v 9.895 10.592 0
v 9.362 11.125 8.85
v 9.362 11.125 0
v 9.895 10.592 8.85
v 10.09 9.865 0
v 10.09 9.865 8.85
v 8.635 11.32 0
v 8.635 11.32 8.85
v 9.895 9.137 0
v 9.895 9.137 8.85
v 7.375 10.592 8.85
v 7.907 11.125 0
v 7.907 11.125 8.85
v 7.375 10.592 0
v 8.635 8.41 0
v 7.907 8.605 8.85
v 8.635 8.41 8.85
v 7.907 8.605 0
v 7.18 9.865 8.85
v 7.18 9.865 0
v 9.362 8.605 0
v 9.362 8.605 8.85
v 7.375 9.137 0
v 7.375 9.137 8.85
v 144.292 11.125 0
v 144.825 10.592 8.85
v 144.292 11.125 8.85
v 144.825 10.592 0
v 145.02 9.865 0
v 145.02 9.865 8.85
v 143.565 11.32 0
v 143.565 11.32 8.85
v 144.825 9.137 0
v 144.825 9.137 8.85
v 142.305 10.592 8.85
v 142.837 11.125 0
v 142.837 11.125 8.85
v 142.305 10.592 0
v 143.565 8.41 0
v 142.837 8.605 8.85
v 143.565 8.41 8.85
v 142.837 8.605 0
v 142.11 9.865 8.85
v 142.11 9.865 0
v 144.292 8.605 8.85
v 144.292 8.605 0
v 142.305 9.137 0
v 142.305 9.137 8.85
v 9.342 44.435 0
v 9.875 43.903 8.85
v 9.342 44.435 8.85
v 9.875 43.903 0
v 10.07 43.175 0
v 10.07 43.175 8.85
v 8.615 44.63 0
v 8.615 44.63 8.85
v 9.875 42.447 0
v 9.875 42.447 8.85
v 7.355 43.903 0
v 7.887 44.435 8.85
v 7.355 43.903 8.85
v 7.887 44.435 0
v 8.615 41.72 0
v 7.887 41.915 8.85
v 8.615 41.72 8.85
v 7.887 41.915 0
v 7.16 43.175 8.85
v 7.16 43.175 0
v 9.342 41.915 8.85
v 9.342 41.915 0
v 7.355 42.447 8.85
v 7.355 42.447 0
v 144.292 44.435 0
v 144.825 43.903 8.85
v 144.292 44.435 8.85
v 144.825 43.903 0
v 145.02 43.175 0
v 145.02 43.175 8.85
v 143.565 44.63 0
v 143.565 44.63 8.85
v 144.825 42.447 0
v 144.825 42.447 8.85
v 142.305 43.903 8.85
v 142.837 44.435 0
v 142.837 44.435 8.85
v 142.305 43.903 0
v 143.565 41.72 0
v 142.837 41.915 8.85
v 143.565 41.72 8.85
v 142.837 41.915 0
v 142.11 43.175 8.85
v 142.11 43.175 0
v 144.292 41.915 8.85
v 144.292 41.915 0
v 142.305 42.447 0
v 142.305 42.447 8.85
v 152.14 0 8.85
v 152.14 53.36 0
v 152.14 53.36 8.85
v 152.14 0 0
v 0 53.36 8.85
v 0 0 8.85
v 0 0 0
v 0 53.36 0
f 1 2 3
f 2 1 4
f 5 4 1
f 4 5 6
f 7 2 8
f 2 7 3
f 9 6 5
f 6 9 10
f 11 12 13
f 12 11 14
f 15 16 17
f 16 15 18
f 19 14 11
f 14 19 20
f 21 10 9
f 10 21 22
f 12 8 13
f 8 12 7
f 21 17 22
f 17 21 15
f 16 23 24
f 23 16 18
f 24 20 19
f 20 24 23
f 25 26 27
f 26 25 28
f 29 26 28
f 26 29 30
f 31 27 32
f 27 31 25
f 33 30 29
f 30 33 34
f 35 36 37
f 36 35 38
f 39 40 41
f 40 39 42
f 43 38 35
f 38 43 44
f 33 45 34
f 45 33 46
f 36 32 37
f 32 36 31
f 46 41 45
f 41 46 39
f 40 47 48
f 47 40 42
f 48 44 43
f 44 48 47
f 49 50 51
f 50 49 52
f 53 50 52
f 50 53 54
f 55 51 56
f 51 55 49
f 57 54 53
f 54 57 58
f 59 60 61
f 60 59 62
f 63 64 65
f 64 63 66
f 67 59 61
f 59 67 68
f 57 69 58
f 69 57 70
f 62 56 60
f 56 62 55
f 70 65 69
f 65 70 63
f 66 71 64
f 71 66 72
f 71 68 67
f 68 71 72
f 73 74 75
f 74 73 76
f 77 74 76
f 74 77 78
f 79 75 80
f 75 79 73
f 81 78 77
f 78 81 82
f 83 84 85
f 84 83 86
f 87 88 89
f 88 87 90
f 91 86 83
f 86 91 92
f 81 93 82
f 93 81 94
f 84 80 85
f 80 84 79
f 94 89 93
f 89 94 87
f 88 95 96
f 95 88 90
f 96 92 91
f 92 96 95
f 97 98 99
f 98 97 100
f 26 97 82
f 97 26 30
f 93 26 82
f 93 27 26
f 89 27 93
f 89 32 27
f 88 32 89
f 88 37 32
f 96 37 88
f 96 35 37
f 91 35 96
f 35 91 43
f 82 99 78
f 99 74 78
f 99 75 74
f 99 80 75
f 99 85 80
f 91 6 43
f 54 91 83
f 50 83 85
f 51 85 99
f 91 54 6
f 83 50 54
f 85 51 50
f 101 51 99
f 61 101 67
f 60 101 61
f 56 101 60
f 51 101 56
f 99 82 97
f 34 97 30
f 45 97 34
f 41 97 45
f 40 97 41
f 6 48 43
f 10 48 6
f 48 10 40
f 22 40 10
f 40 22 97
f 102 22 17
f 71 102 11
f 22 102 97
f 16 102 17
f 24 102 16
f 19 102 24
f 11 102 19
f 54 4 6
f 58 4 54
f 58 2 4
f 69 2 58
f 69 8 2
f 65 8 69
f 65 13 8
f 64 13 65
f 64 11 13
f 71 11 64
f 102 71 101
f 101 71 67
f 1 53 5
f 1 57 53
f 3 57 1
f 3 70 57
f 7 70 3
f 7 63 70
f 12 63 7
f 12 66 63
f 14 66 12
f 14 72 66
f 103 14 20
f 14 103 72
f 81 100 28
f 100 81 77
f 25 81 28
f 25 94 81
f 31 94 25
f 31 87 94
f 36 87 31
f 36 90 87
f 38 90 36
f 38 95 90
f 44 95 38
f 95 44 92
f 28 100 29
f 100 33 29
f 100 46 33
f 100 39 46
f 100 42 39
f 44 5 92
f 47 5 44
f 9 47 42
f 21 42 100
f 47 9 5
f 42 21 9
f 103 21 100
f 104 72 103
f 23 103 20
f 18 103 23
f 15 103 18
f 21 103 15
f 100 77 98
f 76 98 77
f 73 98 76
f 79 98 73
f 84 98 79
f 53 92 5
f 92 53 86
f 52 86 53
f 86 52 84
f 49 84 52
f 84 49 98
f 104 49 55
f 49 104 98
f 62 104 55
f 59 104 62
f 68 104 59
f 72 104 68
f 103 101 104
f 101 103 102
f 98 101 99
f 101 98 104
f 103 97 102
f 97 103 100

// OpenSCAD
//
// This file contains models for breadboards.
//

//--------------------------------------------------------------------------------------
// Half size breadboard
//
module bbs_half_breadboard()
{
    cube([82.46, 54.41, 8.89], center=false);
}

//--------------------------------------------------------------------------------------
// Full size breadboard with screw mounting.  Measurements taken from an Archer brand
// breadboard that I got from Radio Shack (remember them?) years ago.
//
module bbs_full_breadboard()
{
    hole_rad = 2.91/2;
    difference()
    {
        cube([152.14, 53.36, 8.85]);
        translate([0, 0, -0.1]) bbs_full_breadboard_standoffs(9, hole_rad, 12);
    }
}

module bbs_full_breadboard_standoffs(height, radius, facets)
{
    hole_rad = 2.91/2;
    union()
    {
        translate([7.18 + hole_rad, 8.41 + hole_rad, 0]) cylinder(r=radius, h = height, $fn=facets);
        translate([142.11 + hole_rad, 8.41 + hole_rad, 0]) cylinder(r=radius, h = height, $fn=facets);
        translate([7.16 + hole_rad, 41.72 + hole_rad, 0]) cylinder(r=radius, h = height, $fn=facets);
        translate([142.11 + hole_rad, 41.72 + hole_rad, 0]) cylinder(r=radius, h = height, $fn=facets);
    }
}


bbs_full_breadboard();
